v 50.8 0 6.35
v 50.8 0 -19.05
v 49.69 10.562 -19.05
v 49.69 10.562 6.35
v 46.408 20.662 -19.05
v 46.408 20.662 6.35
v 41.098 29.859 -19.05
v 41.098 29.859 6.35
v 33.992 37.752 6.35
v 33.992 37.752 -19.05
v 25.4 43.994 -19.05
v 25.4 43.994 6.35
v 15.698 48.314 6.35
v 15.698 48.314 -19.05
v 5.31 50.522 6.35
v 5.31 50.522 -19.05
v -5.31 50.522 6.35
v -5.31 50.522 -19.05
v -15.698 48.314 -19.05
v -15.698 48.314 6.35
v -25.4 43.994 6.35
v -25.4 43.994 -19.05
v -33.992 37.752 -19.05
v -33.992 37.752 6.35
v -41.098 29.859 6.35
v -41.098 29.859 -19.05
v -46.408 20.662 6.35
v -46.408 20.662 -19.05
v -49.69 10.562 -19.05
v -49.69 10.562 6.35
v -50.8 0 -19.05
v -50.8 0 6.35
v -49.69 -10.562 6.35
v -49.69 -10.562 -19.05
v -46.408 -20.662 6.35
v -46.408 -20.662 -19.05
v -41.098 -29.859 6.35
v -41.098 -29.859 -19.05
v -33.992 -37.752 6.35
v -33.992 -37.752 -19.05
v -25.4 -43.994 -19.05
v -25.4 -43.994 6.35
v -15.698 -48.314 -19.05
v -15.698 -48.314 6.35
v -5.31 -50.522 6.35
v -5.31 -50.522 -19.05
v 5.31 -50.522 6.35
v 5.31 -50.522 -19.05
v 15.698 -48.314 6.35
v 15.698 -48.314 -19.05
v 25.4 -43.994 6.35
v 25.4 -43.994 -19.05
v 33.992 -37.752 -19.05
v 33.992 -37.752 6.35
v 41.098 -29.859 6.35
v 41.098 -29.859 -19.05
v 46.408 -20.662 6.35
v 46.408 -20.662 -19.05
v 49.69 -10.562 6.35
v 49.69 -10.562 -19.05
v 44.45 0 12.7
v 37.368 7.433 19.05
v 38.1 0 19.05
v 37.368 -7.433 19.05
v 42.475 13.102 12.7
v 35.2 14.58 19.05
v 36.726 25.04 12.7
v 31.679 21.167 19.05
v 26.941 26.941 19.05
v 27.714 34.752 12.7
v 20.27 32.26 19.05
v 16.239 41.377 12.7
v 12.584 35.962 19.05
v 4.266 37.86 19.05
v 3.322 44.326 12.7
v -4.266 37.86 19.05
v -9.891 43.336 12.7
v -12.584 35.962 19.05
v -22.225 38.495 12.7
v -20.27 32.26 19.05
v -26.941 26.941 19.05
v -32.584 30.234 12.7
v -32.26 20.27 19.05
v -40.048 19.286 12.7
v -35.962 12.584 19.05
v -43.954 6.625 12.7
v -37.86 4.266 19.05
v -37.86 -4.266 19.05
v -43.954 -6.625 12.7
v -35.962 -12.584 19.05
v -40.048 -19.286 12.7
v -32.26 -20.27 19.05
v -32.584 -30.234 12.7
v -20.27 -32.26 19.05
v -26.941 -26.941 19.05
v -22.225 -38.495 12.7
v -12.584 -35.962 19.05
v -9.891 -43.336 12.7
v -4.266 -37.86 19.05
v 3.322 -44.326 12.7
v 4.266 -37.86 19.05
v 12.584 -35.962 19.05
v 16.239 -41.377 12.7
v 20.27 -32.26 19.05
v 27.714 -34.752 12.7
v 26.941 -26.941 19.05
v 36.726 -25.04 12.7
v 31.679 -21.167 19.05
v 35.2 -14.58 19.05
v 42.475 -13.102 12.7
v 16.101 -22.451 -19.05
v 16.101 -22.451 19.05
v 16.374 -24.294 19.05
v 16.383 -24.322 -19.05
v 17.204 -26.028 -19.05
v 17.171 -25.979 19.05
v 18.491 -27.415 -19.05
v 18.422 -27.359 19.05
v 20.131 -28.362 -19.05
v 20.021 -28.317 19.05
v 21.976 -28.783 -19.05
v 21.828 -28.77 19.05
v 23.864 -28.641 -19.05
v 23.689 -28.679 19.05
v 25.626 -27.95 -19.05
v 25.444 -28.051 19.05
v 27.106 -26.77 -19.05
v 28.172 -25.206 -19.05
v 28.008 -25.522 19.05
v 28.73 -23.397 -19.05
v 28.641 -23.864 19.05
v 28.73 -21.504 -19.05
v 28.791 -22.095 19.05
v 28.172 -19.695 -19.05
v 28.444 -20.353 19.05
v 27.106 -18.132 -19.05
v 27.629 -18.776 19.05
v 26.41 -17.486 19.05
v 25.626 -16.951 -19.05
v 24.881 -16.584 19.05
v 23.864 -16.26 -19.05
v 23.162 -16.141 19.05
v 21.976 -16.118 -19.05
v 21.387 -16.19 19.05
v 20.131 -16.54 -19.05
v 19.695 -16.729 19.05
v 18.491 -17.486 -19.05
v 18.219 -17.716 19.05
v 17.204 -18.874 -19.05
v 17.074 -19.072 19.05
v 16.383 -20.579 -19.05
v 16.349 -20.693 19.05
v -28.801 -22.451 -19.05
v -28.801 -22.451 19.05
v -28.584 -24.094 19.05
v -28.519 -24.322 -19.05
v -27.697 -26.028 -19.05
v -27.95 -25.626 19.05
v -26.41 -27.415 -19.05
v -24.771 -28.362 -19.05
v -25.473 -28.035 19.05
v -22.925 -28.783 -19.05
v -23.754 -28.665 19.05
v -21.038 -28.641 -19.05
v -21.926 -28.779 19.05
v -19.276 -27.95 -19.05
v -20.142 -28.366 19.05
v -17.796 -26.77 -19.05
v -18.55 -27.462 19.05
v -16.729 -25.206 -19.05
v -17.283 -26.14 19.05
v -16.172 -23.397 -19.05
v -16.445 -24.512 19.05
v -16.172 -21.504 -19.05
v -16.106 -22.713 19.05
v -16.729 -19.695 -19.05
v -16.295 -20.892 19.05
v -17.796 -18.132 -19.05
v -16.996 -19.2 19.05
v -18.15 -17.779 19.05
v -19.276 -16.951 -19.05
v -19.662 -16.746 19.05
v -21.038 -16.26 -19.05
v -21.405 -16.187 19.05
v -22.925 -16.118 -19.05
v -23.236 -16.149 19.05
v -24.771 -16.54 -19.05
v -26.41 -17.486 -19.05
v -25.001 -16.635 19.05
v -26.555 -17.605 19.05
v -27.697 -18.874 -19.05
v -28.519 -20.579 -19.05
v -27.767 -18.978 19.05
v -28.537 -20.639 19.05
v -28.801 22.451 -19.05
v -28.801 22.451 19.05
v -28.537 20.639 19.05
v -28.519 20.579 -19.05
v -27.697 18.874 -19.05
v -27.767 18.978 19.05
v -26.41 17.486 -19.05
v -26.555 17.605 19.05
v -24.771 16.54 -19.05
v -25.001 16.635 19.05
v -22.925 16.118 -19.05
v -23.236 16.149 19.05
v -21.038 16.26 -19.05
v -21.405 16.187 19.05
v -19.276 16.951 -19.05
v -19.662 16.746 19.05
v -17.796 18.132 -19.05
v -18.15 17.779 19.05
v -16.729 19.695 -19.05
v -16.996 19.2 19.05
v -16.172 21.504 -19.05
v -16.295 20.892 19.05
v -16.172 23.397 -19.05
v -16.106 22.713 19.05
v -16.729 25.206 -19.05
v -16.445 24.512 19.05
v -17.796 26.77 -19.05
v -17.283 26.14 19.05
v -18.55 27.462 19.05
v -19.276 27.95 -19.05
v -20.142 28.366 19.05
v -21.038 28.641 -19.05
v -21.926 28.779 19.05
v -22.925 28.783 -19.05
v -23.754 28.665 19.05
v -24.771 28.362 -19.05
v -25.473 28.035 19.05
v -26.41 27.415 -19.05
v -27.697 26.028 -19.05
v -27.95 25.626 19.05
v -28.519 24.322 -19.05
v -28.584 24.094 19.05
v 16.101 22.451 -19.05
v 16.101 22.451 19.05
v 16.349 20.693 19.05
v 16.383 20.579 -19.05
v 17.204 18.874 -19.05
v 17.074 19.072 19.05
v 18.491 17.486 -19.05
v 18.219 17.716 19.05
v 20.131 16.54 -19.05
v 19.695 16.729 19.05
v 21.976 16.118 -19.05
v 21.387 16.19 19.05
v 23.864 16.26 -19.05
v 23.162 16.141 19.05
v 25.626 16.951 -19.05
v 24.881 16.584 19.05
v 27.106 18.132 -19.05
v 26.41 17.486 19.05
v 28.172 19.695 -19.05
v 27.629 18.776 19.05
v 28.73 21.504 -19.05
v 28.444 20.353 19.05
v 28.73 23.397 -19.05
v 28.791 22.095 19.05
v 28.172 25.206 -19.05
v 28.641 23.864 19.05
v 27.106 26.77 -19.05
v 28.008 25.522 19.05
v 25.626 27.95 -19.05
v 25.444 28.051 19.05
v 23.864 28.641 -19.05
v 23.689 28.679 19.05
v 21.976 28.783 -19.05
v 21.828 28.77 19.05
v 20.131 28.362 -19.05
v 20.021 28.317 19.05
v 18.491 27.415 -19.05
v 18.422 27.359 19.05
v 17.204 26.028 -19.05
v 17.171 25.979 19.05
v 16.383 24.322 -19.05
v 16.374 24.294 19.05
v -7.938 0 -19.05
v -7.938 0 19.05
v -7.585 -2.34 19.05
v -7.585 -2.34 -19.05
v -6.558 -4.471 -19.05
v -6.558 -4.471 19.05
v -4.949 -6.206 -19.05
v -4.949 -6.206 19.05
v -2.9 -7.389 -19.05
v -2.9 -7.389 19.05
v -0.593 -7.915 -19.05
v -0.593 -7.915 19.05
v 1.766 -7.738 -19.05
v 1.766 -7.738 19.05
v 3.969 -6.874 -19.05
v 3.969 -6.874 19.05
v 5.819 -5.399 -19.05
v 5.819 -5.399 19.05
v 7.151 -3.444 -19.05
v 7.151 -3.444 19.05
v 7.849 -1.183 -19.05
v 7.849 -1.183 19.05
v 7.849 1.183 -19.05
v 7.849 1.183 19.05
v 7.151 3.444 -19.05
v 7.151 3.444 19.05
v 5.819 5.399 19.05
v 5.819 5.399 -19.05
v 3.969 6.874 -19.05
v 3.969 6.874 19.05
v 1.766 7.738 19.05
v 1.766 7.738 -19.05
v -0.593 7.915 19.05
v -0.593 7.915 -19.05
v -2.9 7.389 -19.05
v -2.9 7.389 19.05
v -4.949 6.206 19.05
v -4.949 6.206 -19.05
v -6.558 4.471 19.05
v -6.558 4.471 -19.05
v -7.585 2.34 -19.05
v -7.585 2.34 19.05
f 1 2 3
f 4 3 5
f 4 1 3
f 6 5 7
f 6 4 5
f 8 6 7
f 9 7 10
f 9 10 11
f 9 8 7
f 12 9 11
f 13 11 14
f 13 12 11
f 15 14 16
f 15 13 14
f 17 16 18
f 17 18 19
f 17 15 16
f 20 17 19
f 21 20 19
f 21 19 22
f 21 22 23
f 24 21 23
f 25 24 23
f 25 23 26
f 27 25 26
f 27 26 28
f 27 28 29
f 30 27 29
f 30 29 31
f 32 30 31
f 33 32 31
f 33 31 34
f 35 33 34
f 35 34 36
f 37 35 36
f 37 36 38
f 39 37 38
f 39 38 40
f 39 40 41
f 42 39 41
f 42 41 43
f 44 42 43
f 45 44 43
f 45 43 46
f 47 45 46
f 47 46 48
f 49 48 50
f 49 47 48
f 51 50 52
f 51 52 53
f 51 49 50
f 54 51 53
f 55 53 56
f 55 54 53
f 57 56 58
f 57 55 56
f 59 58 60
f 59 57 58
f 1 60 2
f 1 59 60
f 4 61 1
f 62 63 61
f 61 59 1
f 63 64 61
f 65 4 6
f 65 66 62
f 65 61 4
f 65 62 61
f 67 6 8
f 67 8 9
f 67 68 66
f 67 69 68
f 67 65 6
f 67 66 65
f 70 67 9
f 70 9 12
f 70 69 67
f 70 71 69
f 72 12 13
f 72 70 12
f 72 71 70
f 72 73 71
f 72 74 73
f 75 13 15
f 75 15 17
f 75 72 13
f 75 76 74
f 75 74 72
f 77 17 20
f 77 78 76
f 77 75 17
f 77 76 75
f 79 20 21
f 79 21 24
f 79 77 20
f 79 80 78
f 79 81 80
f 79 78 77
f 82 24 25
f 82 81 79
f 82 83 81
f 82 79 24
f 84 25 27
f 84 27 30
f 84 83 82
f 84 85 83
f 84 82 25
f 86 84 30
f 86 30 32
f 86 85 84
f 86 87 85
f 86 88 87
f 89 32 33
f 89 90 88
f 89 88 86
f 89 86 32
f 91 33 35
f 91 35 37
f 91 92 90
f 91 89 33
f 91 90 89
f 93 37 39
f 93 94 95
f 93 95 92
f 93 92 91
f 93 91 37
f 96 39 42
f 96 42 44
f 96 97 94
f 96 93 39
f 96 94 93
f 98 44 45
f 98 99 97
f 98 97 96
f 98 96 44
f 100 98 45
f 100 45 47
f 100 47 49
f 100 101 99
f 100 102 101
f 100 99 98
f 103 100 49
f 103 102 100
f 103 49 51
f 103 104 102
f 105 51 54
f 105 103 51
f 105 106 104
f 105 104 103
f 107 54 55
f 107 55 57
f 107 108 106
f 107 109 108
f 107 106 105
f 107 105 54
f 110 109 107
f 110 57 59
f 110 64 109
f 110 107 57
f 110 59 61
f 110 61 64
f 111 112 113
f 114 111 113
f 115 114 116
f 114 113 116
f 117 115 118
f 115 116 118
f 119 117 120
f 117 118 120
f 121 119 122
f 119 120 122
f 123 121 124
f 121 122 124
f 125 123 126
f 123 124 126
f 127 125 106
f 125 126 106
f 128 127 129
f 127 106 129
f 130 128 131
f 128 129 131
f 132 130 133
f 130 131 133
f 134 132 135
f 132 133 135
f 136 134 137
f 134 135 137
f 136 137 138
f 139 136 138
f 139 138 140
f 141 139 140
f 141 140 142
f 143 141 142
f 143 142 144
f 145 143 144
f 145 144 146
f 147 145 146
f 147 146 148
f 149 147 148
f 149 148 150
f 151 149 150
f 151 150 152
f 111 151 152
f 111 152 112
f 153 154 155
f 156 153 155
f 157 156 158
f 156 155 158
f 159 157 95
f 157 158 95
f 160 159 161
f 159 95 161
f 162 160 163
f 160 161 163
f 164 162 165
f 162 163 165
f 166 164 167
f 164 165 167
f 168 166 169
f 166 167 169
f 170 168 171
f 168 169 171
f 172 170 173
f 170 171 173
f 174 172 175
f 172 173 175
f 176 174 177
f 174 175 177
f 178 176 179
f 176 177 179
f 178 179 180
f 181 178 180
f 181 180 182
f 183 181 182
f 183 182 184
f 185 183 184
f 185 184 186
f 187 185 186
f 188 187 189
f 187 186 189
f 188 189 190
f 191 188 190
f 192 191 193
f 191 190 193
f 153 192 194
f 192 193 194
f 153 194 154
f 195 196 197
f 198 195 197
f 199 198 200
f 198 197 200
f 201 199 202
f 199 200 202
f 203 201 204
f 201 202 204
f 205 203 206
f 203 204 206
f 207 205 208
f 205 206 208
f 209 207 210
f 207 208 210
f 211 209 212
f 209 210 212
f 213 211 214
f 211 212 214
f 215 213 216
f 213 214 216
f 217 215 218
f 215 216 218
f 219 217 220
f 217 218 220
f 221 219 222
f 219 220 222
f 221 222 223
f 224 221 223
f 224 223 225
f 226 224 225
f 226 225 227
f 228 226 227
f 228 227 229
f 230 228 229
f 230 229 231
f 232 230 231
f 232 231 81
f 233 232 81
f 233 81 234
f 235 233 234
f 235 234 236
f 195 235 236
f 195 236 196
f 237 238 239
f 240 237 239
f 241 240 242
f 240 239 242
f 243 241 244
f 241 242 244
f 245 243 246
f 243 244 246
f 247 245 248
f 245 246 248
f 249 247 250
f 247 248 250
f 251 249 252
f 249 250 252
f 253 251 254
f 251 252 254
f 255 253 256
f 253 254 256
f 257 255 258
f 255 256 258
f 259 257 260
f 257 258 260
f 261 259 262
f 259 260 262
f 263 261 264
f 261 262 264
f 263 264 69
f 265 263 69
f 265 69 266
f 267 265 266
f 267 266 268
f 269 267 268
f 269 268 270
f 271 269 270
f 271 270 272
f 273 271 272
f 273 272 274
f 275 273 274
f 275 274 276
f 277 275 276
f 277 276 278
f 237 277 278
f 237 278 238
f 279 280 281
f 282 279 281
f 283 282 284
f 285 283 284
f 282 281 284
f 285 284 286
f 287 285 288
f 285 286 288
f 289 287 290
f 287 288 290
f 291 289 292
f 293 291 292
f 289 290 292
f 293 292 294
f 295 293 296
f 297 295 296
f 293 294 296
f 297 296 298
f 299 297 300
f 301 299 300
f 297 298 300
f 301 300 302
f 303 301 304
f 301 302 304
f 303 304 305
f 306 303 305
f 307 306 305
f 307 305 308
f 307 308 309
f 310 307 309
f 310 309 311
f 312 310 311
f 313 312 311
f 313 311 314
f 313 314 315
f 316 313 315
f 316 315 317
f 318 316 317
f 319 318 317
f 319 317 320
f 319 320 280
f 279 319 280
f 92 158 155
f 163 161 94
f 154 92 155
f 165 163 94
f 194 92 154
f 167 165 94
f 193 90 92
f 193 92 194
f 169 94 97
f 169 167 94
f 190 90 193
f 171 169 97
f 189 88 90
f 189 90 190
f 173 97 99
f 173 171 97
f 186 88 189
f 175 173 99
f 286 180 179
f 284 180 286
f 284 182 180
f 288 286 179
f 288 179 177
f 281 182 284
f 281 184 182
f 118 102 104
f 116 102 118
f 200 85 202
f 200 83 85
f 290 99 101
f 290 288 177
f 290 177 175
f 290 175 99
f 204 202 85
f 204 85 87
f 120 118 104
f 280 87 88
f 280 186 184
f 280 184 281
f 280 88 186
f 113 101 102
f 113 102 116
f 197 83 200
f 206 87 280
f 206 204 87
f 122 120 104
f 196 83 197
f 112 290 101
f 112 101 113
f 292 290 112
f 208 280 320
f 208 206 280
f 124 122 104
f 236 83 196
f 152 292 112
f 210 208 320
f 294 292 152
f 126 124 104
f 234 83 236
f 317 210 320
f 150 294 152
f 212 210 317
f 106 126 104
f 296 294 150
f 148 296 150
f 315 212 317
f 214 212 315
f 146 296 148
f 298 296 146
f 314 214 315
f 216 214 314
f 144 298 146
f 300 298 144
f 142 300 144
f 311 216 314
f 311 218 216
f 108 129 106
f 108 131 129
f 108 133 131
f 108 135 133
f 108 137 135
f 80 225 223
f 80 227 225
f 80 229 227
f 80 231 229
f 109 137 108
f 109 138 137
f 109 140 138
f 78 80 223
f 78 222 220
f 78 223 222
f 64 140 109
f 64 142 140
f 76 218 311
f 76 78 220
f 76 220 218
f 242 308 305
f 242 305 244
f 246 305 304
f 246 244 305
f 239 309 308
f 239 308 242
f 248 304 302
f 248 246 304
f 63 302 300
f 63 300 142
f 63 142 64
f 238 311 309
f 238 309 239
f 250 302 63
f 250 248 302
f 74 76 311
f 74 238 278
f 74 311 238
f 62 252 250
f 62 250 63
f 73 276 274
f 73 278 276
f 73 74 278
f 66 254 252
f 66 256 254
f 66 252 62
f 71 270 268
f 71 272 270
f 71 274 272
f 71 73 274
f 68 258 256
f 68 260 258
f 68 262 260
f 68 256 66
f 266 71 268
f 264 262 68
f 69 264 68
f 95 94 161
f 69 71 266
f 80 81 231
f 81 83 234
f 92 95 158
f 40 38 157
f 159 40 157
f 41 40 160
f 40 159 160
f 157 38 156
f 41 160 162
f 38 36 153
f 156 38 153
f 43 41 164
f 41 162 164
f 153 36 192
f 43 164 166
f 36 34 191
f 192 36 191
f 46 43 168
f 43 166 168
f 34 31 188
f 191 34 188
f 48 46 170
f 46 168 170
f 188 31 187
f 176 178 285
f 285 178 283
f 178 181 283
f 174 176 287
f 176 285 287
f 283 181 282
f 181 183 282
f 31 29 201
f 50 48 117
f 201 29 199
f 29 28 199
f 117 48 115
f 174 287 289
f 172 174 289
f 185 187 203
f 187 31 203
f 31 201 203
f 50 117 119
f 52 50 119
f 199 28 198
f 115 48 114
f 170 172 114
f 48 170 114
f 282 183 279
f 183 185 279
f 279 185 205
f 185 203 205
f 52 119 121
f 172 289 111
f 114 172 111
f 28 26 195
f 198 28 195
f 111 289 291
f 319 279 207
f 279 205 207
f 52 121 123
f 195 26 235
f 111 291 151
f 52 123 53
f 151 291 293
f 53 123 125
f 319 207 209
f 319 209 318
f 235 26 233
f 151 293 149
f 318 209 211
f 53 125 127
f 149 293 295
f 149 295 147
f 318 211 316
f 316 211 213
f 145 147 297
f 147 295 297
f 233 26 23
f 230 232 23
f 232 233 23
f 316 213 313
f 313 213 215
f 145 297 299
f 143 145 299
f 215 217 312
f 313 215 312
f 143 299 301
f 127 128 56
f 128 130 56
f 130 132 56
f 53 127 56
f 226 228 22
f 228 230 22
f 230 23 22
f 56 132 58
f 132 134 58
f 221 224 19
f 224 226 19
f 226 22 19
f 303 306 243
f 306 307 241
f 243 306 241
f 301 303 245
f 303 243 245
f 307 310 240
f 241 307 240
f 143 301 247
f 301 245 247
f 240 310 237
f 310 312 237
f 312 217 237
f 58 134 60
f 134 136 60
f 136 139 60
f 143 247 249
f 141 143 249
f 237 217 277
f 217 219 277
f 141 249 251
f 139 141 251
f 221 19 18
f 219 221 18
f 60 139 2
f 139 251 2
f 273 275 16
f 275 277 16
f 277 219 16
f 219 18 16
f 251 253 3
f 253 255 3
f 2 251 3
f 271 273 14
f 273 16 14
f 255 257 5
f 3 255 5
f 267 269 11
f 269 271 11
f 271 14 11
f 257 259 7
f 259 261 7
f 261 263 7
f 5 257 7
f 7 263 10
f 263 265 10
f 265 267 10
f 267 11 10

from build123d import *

# Parameters (mm, degrees)
F0_R     = 50.8
F1_DEPTH = 19.05
F2_SIZE  = 12.7
F4_D     = 12.7
F5_D     = 15.875


# Not quite as in the source:
# - a length typed as a fraction of an inch, garbled in the dataset ("3 / 203.2 mm" for 3/8 in), is restored


with BuildPart() as f1:
    # F0 (on Top) → F1 (new body, symmetric)
    with BuildSketch(Plane.XY):
        Circle(F0_R)
    extrude(amount=F1_DEPTH, both=True)

    # F2
    f2_edges = [f1.edges().sort_by_distance(p)[0] for p in [
        (-50.8, 0, 19.05),
    ]]
    chamfer(f2_edges, length=F2_SIZE)

    # F4 (through all)
    with Locations(Plane(origin=(0, 0, -19.05), x_dir=(1, 0, 0), z_dir=(0, 0, -1))):
        with Locations((-22.4506403027, 22.4506403027), (-22.4506403027, -22.4506403027), (22.4506403027, -22.4506403027), (22.4506403027, 22.4506403027)):
            Hole(F4_D / 2)

    # F5 (through all)
    with Locations(Plane(origin=(0, 0, -19.05), x_dir=(1, 0, 0), z_dir=(0, 0, -1))):
        with Locations((0, 0)):
            Hole(F5_D / 2)


solid = f1.part
